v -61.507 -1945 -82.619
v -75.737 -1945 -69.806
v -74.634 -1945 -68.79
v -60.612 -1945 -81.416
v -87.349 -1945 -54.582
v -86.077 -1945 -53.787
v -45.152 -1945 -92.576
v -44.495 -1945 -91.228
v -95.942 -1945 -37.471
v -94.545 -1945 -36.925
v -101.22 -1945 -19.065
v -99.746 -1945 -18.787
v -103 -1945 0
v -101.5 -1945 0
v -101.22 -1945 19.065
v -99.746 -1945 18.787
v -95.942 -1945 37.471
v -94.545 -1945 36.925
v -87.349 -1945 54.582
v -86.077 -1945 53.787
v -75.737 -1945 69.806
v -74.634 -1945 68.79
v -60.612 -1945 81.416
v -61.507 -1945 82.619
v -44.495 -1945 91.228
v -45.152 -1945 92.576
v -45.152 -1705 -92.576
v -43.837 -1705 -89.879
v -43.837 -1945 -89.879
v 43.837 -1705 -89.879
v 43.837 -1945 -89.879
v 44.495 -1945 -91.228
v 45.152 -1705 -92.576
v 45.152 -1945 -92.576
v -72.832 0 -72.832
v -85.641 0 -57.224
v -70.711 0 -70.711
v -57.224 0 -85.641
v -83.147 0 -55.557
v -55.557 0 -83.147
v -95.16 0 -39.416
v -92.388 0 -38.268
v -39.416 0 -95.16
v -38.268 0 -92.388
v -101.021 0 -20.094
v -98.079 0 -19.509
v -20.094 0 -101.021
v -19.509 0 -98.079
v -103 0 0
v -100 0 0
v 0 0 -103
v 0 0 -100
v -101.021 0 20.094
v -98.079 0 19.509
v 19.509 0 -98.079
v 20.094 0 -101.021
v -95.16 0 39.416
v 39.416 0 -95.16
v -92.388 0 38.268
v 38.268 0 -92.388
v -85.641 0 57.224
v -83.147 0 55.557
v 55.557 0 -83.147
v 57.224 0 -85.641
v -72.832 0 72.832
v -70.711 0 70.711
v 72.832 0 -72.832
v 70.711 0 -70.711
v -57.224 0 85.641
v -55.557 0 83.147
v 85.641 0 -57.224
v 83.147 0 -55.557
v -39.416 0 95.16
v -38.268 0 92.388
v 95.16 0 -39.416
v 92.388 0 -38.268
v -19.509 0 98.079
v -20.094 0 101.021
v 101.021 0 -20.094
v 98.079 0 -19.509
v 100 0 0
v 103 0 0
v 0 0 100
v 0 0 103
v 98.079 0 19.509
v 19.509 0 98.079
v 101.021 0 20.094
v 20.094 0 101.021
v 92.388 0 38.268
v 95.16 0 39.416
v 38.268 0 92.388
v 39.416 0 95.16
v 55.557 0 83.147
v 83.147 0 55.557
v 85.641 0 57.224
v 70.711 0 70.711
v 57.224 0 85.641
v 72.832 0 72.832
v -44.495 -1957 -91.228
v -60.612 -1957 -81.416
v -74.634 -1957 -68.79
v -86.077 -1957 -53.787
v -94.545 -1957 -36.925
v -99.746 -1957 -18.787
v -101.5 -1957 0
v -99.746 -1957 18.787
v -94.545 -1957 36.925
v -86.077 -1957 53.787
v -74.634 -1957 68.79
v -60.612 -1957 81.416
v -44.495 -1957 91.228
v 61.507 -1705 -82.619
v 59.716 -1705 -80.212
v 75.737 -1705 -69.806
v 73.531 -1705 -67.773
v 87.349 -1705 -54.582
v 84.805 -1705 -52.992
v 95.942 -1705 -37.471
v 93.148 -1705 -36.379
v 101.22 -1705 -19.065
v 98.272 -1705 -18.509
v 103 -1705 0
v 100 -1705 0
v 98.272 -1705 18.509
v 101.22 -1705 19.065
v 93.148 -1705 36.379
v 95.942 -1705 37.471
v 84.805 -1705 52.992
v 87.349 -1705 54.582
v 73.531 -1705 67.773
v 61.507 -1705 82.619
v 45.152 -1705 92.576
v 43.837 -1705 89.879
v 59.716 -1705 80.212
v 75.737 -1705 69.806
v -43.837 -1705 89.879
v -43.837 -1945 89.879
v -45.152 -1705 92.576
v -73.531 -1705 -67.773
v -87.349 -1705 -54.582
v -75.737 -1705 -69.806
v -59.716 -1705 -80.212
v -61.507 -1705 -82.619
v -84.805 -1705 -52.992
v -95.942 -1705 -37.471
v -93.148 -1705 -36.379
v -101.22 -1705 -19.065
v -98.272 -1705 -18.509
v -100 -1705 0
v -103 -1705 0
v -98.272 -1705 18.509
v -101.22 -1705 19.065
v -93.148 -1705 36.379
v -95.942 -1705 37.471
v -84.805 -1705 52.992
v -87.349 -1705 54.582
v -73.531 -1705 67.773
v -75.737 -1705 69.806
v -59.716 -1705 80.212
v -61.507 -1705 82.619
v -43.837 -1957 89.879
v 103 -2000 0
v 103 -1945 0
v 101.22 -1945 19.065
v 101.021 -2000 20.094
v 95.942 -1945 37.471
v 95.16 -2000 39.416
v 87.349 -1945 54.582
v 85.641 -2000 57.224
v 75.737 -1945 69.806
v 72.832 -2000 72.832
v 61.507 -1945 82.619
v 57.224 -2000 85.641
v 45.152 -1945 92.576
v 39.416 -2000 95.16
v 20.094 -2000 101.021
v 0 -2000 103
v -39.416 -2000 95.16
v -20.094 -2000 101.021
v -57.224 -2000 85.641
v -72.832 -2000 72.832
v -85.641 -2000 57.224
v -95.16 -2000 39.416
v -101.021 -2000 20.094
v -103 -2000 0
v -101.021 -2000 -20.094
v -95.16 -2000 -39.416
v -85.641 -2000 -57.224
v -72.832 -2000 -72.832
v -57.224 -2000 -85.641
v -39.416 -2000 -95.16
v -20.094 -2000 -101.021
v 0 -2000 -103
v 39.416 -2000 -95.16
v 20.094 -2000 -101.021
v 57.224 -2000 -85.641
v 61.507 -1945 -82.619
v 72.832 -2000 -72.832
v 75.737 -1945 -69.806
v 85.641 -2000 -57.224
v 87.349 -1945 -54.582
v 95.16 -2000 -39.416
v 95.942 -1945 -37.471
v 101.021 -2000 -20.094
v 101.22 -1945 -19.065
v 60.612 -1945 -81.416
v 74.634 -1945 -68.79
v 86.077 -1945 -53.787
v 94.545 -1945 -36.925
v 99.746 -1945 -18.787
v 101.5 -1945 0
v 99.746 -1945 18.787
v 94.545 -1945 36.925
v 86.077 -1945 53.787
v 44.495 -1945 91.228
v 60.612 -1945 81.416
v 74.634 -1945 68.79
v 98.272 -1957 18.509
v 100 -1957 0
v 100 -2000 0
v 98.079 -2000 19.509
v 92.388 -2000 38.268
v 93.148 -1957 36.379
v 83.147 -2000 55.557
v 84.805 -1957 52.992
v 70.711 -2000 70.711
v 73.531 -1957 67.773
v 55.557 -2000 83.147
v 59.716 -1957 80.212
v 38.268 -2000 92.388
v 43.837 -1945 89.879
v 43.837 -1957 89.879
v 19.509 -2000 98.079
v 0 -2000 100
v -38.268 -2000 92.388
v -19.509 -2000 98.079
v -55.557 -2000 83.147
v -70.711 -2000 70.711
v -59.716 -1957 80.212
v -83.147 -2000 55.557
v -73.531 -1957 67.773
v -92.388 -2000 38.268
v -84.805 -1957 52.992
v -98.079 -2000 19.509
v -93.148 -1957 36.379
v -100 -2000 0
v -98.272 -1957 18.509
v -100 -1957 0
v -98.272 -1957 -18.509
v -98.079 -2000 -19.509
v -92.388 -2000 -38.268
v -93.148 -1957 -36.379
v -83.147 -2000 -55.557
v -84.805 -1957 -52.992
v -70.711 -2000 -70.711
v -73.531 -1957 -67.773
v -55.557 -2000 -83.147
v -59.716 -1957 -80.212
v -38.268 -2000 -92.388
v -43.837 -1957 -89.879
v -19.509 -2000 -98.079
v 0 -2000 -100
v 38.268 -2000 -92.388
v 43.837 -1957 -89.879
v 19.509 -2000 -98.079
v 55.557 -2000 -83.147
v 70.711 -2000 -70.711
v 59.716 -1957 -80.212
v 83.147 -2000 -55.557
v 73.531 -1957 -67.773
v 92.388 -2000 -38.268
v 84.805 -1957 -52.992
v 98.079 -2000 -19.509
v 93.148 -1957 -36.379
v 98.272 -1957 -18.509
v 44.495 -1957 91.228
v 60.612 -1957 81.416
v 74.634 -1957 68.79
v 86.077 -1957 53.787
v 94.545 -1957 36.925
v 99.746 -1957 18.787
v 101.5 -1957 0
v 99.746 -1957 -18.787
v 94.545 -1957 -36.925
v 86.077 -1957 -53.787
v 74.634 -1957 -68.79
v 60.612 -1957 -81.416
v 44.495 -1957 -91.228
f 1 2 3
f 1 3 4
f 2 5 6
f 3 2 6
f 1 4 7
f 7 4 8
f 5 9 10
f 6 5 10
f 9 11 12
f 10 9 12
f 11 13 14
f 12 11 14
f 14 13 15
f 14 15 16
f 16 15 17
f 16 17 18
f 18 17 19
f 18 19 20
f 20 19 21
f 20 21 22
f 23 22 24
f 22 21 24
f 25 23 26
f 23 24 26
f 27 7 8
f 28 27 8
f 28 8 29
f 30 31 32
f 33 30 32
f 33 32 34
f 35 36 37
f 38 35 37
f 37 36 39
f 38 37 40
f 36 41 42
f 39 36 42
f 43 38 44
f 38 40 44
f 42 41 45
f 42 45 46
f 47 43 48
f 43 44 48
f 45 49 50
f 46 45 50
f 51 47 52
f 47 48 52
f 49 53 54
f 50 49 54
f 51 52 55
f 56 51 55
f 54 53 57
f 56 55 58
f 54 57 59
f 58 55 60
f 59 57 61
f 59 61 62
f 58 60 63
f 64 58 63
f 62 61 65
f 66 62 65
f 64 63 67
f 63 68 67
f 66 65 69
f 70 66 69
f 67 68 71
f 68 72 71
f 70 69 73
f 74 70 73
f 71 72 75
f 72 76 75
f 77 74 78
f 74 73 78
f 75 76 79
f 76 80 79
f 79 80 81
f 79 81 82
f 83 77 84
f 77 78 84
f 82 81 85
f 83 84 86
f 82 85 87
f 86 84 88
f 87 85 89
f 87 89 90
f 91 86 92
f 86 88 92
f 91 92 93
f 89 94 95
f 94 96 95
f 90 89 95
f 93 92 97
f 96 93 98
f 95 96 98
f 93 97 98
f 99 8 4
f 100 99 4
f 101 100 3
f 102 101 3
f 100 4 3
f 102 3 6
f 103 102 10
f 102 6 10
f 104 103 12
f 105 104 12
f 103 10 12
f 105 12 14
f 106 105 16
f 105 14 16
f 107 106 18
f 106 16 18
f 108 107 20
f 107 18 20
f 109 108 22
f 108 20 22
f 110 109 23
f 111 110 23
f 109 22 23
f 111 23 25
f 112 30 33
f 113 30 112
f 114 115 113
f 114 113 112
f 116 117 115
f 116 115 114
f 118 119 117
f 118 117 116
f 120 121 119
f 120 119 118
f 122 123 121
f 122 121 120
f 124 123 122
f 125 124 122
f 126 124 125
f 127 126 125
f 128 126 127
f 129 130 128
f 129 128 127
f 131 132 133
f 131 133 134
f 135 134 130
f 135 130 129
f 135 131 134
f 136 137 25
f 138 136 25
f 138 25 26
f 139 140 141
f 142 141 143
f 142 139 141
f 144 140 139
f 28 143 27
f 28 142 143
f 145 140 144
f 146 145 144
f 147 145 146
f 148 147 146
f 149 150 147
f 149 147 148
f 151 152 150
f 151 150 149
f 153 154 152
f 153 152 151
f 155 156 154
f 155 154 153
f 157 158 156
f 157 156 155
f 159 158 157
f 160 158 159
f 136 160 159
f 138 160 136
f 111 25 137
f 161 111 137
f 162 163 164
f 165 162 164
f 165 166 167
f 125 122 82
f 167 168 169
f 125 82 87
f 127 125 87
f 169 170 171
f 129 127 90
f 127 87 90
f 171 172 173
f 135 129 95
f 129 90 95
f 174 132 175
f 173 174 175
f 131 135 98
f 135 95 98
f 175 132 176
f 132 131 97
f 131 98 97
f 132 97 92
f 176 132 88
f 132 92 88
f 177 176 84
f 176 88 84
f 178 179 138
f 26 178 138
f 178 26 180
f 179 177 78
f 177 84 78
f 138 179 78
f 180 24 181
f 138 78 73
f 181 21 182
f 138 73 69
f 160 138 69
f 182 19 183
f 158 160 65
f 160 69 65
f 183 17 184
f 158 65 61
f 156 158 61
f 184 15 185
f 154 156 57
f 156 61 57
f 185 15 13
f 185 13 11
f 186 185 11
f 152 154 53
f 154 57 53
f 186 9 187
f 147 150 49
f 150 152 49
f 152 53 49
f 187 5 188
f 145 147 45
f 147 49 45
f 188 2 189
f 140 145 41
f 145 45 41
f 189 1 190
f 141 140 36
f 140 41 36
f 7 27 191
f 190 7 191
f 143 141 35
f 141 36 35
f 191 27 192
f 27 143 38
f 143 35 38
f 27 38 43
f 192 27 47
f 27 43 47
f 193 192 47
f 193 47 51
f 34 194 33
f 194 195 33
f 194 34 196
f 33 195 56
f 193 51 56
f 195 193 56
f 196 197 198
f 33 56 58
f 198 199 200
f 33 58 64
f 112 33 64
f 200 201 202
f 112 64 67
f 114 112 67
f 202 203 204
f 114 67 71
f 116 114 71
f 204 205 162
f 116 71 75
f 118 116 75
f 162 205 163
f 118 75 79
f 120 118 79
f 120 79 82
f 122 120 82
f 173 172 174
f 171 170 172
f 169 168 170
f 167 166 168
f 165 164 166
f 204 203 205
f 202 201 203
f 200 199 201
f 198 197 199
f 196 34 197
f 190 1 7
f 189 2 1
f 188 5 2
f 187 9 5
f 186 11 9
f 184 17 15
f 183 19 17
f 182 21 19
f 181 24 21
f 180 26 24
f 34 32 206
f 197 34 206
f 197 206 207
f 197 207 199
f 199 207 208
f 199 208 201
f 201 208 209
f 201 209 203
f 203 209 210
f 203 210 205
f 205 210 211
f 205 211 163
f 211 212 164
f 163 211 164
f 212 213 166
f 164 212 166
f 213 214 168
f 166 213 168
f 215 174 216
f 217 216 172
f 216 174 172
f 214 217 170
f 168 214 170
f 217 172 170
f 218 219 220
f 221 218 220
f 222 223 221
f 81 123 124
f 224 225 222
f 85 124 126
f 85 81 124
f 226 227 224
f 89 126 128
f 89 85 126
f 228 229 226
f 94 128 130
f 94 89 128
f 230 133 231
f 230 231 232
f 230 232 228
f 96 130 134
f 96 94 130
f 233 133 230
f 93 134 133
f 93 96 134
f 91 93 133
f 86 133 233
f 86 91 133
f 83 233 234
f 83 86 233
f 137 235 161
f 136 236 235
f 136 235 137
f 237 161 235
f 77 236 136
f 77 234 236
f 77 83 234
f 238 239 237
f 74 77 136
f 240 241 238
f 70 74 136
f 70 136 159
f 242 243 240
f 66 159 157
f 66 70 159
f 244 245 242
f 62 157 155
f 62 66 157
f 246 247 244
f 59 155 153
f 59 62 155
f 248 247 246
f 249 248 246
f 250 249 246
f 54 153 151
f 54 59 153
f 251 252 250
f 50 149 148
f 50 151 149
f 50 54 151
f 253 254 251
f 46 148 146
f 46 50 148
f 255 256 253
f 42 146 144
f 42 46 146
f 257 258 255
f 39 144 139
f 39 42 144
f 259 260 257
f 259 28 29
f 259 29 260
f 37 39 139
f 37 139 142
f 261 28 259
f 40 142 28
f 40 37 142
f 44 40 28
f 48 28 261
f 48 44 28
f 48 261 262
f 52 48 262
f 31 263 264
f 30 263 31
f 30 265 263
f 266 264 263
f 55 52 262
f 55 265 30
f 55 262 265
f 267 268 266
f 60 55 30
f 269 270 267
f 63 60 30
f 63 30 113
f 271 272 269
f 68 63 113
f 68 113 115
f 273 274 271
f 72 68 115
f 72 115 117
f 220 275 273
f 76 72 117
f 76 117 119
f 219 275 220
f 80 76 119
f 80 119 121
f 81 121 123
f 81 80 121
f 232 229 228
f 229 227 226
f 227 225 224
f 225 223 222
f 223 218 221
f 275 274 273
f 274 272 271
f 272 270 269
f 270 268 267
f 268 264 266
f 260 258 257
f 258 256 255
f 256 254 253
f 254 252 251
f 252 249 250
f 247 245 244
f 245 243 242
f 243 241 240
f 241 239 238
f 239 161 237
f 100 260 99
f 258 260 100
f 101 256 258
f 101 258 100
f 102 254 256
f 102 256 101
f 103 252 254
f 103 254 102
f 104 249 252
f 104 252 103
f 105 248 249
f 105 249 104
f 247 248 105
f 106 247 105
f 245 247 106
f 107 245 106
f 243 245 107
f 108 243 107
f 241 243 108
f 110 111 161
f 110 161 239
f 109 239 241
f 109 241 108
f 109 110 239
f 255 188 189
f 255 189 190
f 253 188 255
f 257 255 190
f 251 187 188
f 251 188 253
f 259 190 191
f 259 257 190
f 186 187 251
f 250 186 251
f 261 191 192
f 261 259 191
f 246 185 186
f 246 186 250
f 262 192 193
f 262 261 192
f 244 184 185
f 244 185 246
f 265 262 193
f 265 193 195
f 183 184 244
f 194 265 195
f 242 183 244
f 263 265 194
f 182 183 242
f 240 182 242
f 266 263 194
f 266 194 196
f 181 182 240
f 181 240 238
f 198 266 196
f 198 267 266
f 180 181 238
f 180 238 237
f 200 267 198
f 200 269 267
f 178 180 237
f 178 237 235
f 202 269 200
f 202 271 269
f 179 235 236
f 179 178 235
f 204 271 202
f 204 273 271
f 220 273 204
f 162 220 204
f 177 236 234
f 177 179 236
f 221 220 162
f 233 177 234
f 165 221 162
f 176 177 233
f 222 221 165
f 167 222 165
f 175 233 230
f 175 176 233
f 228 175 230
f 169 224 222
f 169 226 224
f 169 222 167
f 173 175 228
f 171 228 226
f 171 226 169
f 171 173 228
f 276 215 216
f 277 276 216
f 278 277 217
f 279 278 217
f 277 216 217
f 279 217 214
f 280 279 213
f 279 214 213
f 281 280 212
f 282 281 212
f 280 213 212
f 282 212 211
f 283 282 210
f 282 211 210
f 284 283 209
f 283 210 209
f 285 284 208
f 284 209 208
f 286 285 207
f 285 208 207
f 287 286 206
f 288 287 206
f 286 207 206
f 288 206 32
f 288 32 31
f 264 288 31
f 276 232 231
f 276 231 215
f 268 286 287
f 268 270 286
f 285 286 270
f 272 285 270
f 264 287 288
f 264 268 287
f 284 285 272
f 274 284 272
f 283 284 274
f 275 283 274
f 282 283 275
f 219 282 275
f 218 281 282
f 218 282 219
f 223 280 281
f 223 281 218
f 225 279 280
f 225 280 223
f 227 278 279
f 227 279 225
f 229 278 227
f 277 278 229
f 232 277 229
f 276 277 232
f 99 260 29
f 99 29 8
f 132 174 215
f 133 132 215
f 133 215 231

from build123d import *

# Parameters (mm, degrees)
F0_R     = 103
F0_R_2   = 100
F1_DEPTH = 2000
F4_DEPTH = 240
F6_DEPTH = 12


with BuildPart() as f1:
    # F0 (on Front) → F1 (new body)
    with BuildSketch(Plane.XZ):
        Circle(F0_R)
        Circle(F0_R_2, mode=Mode.SUBTRACT)
    extrude(amount=F1_DEPTH)

    # F3 (on offset) → F4 (cut)
    with BuildSketch(Plane.XZ.offset(1945)):
        with BuildLine():
            Line((14.631978, -30), (45.590599, -93.474581))
            ThreePointArc((45.590599, -93.474581), (104, 0), (45.590599, 93.474581))
            Line((45.590599, 93.474581), (15.458162, 31.693928))
            Line((15.458162, 31.693928), (-15.458162, 31.693928))
            Line((-15.458162, 31.693928), (-45.590599, 93.474581))
            ThreePointArc((-45.590599, 93.474581), (-104, 0), (-45.590599, -93.474581))
            Line((-45.590599, -93.474581), (-14.631978, -30))
            Line((-14.631978, -30), (14.631978, -30))
        make_face()
    extrude(amount=-F4_DEPTH, mode=Mode.SUBTRACT)

    # F5 (on face) → F6 (cut)
    with BuildSketch(Plane(origin=(0, -1945, 0), x_dir=(-1, 0, 0), z_dir=(0, 1, 0))):
        with BuildLine():
            Line((-44.494671, -91.227596), (-7.343568, -15.056546))
            Line((-7.343568, -15.056546), (-7.343568, 15.056546))
            Line((-7.343568, 15.056546), (-44.494671, 91.227596))
            ThreePointArc((-44.494671, 91.227596), (-101.5, 0), (-44.494671, -91.227596))
        make_face()
        with BuildLine():
            Line((7.343568, 15.056546), (7.343568, -15.056546))
            Line((7.343568, -15.056546), (44.494671, -91.227596))
            ThreePointArc((44.494671, -91.227596), (101.5, 0), (44.494671, 91.227596))
            Line((44.494671, 91.227596), (7.343568, 15.056546))
        make_face()
    extrude(amount=-F6_DEPTH, mode=Mode.SUBTRACT)


solid = f1.part
